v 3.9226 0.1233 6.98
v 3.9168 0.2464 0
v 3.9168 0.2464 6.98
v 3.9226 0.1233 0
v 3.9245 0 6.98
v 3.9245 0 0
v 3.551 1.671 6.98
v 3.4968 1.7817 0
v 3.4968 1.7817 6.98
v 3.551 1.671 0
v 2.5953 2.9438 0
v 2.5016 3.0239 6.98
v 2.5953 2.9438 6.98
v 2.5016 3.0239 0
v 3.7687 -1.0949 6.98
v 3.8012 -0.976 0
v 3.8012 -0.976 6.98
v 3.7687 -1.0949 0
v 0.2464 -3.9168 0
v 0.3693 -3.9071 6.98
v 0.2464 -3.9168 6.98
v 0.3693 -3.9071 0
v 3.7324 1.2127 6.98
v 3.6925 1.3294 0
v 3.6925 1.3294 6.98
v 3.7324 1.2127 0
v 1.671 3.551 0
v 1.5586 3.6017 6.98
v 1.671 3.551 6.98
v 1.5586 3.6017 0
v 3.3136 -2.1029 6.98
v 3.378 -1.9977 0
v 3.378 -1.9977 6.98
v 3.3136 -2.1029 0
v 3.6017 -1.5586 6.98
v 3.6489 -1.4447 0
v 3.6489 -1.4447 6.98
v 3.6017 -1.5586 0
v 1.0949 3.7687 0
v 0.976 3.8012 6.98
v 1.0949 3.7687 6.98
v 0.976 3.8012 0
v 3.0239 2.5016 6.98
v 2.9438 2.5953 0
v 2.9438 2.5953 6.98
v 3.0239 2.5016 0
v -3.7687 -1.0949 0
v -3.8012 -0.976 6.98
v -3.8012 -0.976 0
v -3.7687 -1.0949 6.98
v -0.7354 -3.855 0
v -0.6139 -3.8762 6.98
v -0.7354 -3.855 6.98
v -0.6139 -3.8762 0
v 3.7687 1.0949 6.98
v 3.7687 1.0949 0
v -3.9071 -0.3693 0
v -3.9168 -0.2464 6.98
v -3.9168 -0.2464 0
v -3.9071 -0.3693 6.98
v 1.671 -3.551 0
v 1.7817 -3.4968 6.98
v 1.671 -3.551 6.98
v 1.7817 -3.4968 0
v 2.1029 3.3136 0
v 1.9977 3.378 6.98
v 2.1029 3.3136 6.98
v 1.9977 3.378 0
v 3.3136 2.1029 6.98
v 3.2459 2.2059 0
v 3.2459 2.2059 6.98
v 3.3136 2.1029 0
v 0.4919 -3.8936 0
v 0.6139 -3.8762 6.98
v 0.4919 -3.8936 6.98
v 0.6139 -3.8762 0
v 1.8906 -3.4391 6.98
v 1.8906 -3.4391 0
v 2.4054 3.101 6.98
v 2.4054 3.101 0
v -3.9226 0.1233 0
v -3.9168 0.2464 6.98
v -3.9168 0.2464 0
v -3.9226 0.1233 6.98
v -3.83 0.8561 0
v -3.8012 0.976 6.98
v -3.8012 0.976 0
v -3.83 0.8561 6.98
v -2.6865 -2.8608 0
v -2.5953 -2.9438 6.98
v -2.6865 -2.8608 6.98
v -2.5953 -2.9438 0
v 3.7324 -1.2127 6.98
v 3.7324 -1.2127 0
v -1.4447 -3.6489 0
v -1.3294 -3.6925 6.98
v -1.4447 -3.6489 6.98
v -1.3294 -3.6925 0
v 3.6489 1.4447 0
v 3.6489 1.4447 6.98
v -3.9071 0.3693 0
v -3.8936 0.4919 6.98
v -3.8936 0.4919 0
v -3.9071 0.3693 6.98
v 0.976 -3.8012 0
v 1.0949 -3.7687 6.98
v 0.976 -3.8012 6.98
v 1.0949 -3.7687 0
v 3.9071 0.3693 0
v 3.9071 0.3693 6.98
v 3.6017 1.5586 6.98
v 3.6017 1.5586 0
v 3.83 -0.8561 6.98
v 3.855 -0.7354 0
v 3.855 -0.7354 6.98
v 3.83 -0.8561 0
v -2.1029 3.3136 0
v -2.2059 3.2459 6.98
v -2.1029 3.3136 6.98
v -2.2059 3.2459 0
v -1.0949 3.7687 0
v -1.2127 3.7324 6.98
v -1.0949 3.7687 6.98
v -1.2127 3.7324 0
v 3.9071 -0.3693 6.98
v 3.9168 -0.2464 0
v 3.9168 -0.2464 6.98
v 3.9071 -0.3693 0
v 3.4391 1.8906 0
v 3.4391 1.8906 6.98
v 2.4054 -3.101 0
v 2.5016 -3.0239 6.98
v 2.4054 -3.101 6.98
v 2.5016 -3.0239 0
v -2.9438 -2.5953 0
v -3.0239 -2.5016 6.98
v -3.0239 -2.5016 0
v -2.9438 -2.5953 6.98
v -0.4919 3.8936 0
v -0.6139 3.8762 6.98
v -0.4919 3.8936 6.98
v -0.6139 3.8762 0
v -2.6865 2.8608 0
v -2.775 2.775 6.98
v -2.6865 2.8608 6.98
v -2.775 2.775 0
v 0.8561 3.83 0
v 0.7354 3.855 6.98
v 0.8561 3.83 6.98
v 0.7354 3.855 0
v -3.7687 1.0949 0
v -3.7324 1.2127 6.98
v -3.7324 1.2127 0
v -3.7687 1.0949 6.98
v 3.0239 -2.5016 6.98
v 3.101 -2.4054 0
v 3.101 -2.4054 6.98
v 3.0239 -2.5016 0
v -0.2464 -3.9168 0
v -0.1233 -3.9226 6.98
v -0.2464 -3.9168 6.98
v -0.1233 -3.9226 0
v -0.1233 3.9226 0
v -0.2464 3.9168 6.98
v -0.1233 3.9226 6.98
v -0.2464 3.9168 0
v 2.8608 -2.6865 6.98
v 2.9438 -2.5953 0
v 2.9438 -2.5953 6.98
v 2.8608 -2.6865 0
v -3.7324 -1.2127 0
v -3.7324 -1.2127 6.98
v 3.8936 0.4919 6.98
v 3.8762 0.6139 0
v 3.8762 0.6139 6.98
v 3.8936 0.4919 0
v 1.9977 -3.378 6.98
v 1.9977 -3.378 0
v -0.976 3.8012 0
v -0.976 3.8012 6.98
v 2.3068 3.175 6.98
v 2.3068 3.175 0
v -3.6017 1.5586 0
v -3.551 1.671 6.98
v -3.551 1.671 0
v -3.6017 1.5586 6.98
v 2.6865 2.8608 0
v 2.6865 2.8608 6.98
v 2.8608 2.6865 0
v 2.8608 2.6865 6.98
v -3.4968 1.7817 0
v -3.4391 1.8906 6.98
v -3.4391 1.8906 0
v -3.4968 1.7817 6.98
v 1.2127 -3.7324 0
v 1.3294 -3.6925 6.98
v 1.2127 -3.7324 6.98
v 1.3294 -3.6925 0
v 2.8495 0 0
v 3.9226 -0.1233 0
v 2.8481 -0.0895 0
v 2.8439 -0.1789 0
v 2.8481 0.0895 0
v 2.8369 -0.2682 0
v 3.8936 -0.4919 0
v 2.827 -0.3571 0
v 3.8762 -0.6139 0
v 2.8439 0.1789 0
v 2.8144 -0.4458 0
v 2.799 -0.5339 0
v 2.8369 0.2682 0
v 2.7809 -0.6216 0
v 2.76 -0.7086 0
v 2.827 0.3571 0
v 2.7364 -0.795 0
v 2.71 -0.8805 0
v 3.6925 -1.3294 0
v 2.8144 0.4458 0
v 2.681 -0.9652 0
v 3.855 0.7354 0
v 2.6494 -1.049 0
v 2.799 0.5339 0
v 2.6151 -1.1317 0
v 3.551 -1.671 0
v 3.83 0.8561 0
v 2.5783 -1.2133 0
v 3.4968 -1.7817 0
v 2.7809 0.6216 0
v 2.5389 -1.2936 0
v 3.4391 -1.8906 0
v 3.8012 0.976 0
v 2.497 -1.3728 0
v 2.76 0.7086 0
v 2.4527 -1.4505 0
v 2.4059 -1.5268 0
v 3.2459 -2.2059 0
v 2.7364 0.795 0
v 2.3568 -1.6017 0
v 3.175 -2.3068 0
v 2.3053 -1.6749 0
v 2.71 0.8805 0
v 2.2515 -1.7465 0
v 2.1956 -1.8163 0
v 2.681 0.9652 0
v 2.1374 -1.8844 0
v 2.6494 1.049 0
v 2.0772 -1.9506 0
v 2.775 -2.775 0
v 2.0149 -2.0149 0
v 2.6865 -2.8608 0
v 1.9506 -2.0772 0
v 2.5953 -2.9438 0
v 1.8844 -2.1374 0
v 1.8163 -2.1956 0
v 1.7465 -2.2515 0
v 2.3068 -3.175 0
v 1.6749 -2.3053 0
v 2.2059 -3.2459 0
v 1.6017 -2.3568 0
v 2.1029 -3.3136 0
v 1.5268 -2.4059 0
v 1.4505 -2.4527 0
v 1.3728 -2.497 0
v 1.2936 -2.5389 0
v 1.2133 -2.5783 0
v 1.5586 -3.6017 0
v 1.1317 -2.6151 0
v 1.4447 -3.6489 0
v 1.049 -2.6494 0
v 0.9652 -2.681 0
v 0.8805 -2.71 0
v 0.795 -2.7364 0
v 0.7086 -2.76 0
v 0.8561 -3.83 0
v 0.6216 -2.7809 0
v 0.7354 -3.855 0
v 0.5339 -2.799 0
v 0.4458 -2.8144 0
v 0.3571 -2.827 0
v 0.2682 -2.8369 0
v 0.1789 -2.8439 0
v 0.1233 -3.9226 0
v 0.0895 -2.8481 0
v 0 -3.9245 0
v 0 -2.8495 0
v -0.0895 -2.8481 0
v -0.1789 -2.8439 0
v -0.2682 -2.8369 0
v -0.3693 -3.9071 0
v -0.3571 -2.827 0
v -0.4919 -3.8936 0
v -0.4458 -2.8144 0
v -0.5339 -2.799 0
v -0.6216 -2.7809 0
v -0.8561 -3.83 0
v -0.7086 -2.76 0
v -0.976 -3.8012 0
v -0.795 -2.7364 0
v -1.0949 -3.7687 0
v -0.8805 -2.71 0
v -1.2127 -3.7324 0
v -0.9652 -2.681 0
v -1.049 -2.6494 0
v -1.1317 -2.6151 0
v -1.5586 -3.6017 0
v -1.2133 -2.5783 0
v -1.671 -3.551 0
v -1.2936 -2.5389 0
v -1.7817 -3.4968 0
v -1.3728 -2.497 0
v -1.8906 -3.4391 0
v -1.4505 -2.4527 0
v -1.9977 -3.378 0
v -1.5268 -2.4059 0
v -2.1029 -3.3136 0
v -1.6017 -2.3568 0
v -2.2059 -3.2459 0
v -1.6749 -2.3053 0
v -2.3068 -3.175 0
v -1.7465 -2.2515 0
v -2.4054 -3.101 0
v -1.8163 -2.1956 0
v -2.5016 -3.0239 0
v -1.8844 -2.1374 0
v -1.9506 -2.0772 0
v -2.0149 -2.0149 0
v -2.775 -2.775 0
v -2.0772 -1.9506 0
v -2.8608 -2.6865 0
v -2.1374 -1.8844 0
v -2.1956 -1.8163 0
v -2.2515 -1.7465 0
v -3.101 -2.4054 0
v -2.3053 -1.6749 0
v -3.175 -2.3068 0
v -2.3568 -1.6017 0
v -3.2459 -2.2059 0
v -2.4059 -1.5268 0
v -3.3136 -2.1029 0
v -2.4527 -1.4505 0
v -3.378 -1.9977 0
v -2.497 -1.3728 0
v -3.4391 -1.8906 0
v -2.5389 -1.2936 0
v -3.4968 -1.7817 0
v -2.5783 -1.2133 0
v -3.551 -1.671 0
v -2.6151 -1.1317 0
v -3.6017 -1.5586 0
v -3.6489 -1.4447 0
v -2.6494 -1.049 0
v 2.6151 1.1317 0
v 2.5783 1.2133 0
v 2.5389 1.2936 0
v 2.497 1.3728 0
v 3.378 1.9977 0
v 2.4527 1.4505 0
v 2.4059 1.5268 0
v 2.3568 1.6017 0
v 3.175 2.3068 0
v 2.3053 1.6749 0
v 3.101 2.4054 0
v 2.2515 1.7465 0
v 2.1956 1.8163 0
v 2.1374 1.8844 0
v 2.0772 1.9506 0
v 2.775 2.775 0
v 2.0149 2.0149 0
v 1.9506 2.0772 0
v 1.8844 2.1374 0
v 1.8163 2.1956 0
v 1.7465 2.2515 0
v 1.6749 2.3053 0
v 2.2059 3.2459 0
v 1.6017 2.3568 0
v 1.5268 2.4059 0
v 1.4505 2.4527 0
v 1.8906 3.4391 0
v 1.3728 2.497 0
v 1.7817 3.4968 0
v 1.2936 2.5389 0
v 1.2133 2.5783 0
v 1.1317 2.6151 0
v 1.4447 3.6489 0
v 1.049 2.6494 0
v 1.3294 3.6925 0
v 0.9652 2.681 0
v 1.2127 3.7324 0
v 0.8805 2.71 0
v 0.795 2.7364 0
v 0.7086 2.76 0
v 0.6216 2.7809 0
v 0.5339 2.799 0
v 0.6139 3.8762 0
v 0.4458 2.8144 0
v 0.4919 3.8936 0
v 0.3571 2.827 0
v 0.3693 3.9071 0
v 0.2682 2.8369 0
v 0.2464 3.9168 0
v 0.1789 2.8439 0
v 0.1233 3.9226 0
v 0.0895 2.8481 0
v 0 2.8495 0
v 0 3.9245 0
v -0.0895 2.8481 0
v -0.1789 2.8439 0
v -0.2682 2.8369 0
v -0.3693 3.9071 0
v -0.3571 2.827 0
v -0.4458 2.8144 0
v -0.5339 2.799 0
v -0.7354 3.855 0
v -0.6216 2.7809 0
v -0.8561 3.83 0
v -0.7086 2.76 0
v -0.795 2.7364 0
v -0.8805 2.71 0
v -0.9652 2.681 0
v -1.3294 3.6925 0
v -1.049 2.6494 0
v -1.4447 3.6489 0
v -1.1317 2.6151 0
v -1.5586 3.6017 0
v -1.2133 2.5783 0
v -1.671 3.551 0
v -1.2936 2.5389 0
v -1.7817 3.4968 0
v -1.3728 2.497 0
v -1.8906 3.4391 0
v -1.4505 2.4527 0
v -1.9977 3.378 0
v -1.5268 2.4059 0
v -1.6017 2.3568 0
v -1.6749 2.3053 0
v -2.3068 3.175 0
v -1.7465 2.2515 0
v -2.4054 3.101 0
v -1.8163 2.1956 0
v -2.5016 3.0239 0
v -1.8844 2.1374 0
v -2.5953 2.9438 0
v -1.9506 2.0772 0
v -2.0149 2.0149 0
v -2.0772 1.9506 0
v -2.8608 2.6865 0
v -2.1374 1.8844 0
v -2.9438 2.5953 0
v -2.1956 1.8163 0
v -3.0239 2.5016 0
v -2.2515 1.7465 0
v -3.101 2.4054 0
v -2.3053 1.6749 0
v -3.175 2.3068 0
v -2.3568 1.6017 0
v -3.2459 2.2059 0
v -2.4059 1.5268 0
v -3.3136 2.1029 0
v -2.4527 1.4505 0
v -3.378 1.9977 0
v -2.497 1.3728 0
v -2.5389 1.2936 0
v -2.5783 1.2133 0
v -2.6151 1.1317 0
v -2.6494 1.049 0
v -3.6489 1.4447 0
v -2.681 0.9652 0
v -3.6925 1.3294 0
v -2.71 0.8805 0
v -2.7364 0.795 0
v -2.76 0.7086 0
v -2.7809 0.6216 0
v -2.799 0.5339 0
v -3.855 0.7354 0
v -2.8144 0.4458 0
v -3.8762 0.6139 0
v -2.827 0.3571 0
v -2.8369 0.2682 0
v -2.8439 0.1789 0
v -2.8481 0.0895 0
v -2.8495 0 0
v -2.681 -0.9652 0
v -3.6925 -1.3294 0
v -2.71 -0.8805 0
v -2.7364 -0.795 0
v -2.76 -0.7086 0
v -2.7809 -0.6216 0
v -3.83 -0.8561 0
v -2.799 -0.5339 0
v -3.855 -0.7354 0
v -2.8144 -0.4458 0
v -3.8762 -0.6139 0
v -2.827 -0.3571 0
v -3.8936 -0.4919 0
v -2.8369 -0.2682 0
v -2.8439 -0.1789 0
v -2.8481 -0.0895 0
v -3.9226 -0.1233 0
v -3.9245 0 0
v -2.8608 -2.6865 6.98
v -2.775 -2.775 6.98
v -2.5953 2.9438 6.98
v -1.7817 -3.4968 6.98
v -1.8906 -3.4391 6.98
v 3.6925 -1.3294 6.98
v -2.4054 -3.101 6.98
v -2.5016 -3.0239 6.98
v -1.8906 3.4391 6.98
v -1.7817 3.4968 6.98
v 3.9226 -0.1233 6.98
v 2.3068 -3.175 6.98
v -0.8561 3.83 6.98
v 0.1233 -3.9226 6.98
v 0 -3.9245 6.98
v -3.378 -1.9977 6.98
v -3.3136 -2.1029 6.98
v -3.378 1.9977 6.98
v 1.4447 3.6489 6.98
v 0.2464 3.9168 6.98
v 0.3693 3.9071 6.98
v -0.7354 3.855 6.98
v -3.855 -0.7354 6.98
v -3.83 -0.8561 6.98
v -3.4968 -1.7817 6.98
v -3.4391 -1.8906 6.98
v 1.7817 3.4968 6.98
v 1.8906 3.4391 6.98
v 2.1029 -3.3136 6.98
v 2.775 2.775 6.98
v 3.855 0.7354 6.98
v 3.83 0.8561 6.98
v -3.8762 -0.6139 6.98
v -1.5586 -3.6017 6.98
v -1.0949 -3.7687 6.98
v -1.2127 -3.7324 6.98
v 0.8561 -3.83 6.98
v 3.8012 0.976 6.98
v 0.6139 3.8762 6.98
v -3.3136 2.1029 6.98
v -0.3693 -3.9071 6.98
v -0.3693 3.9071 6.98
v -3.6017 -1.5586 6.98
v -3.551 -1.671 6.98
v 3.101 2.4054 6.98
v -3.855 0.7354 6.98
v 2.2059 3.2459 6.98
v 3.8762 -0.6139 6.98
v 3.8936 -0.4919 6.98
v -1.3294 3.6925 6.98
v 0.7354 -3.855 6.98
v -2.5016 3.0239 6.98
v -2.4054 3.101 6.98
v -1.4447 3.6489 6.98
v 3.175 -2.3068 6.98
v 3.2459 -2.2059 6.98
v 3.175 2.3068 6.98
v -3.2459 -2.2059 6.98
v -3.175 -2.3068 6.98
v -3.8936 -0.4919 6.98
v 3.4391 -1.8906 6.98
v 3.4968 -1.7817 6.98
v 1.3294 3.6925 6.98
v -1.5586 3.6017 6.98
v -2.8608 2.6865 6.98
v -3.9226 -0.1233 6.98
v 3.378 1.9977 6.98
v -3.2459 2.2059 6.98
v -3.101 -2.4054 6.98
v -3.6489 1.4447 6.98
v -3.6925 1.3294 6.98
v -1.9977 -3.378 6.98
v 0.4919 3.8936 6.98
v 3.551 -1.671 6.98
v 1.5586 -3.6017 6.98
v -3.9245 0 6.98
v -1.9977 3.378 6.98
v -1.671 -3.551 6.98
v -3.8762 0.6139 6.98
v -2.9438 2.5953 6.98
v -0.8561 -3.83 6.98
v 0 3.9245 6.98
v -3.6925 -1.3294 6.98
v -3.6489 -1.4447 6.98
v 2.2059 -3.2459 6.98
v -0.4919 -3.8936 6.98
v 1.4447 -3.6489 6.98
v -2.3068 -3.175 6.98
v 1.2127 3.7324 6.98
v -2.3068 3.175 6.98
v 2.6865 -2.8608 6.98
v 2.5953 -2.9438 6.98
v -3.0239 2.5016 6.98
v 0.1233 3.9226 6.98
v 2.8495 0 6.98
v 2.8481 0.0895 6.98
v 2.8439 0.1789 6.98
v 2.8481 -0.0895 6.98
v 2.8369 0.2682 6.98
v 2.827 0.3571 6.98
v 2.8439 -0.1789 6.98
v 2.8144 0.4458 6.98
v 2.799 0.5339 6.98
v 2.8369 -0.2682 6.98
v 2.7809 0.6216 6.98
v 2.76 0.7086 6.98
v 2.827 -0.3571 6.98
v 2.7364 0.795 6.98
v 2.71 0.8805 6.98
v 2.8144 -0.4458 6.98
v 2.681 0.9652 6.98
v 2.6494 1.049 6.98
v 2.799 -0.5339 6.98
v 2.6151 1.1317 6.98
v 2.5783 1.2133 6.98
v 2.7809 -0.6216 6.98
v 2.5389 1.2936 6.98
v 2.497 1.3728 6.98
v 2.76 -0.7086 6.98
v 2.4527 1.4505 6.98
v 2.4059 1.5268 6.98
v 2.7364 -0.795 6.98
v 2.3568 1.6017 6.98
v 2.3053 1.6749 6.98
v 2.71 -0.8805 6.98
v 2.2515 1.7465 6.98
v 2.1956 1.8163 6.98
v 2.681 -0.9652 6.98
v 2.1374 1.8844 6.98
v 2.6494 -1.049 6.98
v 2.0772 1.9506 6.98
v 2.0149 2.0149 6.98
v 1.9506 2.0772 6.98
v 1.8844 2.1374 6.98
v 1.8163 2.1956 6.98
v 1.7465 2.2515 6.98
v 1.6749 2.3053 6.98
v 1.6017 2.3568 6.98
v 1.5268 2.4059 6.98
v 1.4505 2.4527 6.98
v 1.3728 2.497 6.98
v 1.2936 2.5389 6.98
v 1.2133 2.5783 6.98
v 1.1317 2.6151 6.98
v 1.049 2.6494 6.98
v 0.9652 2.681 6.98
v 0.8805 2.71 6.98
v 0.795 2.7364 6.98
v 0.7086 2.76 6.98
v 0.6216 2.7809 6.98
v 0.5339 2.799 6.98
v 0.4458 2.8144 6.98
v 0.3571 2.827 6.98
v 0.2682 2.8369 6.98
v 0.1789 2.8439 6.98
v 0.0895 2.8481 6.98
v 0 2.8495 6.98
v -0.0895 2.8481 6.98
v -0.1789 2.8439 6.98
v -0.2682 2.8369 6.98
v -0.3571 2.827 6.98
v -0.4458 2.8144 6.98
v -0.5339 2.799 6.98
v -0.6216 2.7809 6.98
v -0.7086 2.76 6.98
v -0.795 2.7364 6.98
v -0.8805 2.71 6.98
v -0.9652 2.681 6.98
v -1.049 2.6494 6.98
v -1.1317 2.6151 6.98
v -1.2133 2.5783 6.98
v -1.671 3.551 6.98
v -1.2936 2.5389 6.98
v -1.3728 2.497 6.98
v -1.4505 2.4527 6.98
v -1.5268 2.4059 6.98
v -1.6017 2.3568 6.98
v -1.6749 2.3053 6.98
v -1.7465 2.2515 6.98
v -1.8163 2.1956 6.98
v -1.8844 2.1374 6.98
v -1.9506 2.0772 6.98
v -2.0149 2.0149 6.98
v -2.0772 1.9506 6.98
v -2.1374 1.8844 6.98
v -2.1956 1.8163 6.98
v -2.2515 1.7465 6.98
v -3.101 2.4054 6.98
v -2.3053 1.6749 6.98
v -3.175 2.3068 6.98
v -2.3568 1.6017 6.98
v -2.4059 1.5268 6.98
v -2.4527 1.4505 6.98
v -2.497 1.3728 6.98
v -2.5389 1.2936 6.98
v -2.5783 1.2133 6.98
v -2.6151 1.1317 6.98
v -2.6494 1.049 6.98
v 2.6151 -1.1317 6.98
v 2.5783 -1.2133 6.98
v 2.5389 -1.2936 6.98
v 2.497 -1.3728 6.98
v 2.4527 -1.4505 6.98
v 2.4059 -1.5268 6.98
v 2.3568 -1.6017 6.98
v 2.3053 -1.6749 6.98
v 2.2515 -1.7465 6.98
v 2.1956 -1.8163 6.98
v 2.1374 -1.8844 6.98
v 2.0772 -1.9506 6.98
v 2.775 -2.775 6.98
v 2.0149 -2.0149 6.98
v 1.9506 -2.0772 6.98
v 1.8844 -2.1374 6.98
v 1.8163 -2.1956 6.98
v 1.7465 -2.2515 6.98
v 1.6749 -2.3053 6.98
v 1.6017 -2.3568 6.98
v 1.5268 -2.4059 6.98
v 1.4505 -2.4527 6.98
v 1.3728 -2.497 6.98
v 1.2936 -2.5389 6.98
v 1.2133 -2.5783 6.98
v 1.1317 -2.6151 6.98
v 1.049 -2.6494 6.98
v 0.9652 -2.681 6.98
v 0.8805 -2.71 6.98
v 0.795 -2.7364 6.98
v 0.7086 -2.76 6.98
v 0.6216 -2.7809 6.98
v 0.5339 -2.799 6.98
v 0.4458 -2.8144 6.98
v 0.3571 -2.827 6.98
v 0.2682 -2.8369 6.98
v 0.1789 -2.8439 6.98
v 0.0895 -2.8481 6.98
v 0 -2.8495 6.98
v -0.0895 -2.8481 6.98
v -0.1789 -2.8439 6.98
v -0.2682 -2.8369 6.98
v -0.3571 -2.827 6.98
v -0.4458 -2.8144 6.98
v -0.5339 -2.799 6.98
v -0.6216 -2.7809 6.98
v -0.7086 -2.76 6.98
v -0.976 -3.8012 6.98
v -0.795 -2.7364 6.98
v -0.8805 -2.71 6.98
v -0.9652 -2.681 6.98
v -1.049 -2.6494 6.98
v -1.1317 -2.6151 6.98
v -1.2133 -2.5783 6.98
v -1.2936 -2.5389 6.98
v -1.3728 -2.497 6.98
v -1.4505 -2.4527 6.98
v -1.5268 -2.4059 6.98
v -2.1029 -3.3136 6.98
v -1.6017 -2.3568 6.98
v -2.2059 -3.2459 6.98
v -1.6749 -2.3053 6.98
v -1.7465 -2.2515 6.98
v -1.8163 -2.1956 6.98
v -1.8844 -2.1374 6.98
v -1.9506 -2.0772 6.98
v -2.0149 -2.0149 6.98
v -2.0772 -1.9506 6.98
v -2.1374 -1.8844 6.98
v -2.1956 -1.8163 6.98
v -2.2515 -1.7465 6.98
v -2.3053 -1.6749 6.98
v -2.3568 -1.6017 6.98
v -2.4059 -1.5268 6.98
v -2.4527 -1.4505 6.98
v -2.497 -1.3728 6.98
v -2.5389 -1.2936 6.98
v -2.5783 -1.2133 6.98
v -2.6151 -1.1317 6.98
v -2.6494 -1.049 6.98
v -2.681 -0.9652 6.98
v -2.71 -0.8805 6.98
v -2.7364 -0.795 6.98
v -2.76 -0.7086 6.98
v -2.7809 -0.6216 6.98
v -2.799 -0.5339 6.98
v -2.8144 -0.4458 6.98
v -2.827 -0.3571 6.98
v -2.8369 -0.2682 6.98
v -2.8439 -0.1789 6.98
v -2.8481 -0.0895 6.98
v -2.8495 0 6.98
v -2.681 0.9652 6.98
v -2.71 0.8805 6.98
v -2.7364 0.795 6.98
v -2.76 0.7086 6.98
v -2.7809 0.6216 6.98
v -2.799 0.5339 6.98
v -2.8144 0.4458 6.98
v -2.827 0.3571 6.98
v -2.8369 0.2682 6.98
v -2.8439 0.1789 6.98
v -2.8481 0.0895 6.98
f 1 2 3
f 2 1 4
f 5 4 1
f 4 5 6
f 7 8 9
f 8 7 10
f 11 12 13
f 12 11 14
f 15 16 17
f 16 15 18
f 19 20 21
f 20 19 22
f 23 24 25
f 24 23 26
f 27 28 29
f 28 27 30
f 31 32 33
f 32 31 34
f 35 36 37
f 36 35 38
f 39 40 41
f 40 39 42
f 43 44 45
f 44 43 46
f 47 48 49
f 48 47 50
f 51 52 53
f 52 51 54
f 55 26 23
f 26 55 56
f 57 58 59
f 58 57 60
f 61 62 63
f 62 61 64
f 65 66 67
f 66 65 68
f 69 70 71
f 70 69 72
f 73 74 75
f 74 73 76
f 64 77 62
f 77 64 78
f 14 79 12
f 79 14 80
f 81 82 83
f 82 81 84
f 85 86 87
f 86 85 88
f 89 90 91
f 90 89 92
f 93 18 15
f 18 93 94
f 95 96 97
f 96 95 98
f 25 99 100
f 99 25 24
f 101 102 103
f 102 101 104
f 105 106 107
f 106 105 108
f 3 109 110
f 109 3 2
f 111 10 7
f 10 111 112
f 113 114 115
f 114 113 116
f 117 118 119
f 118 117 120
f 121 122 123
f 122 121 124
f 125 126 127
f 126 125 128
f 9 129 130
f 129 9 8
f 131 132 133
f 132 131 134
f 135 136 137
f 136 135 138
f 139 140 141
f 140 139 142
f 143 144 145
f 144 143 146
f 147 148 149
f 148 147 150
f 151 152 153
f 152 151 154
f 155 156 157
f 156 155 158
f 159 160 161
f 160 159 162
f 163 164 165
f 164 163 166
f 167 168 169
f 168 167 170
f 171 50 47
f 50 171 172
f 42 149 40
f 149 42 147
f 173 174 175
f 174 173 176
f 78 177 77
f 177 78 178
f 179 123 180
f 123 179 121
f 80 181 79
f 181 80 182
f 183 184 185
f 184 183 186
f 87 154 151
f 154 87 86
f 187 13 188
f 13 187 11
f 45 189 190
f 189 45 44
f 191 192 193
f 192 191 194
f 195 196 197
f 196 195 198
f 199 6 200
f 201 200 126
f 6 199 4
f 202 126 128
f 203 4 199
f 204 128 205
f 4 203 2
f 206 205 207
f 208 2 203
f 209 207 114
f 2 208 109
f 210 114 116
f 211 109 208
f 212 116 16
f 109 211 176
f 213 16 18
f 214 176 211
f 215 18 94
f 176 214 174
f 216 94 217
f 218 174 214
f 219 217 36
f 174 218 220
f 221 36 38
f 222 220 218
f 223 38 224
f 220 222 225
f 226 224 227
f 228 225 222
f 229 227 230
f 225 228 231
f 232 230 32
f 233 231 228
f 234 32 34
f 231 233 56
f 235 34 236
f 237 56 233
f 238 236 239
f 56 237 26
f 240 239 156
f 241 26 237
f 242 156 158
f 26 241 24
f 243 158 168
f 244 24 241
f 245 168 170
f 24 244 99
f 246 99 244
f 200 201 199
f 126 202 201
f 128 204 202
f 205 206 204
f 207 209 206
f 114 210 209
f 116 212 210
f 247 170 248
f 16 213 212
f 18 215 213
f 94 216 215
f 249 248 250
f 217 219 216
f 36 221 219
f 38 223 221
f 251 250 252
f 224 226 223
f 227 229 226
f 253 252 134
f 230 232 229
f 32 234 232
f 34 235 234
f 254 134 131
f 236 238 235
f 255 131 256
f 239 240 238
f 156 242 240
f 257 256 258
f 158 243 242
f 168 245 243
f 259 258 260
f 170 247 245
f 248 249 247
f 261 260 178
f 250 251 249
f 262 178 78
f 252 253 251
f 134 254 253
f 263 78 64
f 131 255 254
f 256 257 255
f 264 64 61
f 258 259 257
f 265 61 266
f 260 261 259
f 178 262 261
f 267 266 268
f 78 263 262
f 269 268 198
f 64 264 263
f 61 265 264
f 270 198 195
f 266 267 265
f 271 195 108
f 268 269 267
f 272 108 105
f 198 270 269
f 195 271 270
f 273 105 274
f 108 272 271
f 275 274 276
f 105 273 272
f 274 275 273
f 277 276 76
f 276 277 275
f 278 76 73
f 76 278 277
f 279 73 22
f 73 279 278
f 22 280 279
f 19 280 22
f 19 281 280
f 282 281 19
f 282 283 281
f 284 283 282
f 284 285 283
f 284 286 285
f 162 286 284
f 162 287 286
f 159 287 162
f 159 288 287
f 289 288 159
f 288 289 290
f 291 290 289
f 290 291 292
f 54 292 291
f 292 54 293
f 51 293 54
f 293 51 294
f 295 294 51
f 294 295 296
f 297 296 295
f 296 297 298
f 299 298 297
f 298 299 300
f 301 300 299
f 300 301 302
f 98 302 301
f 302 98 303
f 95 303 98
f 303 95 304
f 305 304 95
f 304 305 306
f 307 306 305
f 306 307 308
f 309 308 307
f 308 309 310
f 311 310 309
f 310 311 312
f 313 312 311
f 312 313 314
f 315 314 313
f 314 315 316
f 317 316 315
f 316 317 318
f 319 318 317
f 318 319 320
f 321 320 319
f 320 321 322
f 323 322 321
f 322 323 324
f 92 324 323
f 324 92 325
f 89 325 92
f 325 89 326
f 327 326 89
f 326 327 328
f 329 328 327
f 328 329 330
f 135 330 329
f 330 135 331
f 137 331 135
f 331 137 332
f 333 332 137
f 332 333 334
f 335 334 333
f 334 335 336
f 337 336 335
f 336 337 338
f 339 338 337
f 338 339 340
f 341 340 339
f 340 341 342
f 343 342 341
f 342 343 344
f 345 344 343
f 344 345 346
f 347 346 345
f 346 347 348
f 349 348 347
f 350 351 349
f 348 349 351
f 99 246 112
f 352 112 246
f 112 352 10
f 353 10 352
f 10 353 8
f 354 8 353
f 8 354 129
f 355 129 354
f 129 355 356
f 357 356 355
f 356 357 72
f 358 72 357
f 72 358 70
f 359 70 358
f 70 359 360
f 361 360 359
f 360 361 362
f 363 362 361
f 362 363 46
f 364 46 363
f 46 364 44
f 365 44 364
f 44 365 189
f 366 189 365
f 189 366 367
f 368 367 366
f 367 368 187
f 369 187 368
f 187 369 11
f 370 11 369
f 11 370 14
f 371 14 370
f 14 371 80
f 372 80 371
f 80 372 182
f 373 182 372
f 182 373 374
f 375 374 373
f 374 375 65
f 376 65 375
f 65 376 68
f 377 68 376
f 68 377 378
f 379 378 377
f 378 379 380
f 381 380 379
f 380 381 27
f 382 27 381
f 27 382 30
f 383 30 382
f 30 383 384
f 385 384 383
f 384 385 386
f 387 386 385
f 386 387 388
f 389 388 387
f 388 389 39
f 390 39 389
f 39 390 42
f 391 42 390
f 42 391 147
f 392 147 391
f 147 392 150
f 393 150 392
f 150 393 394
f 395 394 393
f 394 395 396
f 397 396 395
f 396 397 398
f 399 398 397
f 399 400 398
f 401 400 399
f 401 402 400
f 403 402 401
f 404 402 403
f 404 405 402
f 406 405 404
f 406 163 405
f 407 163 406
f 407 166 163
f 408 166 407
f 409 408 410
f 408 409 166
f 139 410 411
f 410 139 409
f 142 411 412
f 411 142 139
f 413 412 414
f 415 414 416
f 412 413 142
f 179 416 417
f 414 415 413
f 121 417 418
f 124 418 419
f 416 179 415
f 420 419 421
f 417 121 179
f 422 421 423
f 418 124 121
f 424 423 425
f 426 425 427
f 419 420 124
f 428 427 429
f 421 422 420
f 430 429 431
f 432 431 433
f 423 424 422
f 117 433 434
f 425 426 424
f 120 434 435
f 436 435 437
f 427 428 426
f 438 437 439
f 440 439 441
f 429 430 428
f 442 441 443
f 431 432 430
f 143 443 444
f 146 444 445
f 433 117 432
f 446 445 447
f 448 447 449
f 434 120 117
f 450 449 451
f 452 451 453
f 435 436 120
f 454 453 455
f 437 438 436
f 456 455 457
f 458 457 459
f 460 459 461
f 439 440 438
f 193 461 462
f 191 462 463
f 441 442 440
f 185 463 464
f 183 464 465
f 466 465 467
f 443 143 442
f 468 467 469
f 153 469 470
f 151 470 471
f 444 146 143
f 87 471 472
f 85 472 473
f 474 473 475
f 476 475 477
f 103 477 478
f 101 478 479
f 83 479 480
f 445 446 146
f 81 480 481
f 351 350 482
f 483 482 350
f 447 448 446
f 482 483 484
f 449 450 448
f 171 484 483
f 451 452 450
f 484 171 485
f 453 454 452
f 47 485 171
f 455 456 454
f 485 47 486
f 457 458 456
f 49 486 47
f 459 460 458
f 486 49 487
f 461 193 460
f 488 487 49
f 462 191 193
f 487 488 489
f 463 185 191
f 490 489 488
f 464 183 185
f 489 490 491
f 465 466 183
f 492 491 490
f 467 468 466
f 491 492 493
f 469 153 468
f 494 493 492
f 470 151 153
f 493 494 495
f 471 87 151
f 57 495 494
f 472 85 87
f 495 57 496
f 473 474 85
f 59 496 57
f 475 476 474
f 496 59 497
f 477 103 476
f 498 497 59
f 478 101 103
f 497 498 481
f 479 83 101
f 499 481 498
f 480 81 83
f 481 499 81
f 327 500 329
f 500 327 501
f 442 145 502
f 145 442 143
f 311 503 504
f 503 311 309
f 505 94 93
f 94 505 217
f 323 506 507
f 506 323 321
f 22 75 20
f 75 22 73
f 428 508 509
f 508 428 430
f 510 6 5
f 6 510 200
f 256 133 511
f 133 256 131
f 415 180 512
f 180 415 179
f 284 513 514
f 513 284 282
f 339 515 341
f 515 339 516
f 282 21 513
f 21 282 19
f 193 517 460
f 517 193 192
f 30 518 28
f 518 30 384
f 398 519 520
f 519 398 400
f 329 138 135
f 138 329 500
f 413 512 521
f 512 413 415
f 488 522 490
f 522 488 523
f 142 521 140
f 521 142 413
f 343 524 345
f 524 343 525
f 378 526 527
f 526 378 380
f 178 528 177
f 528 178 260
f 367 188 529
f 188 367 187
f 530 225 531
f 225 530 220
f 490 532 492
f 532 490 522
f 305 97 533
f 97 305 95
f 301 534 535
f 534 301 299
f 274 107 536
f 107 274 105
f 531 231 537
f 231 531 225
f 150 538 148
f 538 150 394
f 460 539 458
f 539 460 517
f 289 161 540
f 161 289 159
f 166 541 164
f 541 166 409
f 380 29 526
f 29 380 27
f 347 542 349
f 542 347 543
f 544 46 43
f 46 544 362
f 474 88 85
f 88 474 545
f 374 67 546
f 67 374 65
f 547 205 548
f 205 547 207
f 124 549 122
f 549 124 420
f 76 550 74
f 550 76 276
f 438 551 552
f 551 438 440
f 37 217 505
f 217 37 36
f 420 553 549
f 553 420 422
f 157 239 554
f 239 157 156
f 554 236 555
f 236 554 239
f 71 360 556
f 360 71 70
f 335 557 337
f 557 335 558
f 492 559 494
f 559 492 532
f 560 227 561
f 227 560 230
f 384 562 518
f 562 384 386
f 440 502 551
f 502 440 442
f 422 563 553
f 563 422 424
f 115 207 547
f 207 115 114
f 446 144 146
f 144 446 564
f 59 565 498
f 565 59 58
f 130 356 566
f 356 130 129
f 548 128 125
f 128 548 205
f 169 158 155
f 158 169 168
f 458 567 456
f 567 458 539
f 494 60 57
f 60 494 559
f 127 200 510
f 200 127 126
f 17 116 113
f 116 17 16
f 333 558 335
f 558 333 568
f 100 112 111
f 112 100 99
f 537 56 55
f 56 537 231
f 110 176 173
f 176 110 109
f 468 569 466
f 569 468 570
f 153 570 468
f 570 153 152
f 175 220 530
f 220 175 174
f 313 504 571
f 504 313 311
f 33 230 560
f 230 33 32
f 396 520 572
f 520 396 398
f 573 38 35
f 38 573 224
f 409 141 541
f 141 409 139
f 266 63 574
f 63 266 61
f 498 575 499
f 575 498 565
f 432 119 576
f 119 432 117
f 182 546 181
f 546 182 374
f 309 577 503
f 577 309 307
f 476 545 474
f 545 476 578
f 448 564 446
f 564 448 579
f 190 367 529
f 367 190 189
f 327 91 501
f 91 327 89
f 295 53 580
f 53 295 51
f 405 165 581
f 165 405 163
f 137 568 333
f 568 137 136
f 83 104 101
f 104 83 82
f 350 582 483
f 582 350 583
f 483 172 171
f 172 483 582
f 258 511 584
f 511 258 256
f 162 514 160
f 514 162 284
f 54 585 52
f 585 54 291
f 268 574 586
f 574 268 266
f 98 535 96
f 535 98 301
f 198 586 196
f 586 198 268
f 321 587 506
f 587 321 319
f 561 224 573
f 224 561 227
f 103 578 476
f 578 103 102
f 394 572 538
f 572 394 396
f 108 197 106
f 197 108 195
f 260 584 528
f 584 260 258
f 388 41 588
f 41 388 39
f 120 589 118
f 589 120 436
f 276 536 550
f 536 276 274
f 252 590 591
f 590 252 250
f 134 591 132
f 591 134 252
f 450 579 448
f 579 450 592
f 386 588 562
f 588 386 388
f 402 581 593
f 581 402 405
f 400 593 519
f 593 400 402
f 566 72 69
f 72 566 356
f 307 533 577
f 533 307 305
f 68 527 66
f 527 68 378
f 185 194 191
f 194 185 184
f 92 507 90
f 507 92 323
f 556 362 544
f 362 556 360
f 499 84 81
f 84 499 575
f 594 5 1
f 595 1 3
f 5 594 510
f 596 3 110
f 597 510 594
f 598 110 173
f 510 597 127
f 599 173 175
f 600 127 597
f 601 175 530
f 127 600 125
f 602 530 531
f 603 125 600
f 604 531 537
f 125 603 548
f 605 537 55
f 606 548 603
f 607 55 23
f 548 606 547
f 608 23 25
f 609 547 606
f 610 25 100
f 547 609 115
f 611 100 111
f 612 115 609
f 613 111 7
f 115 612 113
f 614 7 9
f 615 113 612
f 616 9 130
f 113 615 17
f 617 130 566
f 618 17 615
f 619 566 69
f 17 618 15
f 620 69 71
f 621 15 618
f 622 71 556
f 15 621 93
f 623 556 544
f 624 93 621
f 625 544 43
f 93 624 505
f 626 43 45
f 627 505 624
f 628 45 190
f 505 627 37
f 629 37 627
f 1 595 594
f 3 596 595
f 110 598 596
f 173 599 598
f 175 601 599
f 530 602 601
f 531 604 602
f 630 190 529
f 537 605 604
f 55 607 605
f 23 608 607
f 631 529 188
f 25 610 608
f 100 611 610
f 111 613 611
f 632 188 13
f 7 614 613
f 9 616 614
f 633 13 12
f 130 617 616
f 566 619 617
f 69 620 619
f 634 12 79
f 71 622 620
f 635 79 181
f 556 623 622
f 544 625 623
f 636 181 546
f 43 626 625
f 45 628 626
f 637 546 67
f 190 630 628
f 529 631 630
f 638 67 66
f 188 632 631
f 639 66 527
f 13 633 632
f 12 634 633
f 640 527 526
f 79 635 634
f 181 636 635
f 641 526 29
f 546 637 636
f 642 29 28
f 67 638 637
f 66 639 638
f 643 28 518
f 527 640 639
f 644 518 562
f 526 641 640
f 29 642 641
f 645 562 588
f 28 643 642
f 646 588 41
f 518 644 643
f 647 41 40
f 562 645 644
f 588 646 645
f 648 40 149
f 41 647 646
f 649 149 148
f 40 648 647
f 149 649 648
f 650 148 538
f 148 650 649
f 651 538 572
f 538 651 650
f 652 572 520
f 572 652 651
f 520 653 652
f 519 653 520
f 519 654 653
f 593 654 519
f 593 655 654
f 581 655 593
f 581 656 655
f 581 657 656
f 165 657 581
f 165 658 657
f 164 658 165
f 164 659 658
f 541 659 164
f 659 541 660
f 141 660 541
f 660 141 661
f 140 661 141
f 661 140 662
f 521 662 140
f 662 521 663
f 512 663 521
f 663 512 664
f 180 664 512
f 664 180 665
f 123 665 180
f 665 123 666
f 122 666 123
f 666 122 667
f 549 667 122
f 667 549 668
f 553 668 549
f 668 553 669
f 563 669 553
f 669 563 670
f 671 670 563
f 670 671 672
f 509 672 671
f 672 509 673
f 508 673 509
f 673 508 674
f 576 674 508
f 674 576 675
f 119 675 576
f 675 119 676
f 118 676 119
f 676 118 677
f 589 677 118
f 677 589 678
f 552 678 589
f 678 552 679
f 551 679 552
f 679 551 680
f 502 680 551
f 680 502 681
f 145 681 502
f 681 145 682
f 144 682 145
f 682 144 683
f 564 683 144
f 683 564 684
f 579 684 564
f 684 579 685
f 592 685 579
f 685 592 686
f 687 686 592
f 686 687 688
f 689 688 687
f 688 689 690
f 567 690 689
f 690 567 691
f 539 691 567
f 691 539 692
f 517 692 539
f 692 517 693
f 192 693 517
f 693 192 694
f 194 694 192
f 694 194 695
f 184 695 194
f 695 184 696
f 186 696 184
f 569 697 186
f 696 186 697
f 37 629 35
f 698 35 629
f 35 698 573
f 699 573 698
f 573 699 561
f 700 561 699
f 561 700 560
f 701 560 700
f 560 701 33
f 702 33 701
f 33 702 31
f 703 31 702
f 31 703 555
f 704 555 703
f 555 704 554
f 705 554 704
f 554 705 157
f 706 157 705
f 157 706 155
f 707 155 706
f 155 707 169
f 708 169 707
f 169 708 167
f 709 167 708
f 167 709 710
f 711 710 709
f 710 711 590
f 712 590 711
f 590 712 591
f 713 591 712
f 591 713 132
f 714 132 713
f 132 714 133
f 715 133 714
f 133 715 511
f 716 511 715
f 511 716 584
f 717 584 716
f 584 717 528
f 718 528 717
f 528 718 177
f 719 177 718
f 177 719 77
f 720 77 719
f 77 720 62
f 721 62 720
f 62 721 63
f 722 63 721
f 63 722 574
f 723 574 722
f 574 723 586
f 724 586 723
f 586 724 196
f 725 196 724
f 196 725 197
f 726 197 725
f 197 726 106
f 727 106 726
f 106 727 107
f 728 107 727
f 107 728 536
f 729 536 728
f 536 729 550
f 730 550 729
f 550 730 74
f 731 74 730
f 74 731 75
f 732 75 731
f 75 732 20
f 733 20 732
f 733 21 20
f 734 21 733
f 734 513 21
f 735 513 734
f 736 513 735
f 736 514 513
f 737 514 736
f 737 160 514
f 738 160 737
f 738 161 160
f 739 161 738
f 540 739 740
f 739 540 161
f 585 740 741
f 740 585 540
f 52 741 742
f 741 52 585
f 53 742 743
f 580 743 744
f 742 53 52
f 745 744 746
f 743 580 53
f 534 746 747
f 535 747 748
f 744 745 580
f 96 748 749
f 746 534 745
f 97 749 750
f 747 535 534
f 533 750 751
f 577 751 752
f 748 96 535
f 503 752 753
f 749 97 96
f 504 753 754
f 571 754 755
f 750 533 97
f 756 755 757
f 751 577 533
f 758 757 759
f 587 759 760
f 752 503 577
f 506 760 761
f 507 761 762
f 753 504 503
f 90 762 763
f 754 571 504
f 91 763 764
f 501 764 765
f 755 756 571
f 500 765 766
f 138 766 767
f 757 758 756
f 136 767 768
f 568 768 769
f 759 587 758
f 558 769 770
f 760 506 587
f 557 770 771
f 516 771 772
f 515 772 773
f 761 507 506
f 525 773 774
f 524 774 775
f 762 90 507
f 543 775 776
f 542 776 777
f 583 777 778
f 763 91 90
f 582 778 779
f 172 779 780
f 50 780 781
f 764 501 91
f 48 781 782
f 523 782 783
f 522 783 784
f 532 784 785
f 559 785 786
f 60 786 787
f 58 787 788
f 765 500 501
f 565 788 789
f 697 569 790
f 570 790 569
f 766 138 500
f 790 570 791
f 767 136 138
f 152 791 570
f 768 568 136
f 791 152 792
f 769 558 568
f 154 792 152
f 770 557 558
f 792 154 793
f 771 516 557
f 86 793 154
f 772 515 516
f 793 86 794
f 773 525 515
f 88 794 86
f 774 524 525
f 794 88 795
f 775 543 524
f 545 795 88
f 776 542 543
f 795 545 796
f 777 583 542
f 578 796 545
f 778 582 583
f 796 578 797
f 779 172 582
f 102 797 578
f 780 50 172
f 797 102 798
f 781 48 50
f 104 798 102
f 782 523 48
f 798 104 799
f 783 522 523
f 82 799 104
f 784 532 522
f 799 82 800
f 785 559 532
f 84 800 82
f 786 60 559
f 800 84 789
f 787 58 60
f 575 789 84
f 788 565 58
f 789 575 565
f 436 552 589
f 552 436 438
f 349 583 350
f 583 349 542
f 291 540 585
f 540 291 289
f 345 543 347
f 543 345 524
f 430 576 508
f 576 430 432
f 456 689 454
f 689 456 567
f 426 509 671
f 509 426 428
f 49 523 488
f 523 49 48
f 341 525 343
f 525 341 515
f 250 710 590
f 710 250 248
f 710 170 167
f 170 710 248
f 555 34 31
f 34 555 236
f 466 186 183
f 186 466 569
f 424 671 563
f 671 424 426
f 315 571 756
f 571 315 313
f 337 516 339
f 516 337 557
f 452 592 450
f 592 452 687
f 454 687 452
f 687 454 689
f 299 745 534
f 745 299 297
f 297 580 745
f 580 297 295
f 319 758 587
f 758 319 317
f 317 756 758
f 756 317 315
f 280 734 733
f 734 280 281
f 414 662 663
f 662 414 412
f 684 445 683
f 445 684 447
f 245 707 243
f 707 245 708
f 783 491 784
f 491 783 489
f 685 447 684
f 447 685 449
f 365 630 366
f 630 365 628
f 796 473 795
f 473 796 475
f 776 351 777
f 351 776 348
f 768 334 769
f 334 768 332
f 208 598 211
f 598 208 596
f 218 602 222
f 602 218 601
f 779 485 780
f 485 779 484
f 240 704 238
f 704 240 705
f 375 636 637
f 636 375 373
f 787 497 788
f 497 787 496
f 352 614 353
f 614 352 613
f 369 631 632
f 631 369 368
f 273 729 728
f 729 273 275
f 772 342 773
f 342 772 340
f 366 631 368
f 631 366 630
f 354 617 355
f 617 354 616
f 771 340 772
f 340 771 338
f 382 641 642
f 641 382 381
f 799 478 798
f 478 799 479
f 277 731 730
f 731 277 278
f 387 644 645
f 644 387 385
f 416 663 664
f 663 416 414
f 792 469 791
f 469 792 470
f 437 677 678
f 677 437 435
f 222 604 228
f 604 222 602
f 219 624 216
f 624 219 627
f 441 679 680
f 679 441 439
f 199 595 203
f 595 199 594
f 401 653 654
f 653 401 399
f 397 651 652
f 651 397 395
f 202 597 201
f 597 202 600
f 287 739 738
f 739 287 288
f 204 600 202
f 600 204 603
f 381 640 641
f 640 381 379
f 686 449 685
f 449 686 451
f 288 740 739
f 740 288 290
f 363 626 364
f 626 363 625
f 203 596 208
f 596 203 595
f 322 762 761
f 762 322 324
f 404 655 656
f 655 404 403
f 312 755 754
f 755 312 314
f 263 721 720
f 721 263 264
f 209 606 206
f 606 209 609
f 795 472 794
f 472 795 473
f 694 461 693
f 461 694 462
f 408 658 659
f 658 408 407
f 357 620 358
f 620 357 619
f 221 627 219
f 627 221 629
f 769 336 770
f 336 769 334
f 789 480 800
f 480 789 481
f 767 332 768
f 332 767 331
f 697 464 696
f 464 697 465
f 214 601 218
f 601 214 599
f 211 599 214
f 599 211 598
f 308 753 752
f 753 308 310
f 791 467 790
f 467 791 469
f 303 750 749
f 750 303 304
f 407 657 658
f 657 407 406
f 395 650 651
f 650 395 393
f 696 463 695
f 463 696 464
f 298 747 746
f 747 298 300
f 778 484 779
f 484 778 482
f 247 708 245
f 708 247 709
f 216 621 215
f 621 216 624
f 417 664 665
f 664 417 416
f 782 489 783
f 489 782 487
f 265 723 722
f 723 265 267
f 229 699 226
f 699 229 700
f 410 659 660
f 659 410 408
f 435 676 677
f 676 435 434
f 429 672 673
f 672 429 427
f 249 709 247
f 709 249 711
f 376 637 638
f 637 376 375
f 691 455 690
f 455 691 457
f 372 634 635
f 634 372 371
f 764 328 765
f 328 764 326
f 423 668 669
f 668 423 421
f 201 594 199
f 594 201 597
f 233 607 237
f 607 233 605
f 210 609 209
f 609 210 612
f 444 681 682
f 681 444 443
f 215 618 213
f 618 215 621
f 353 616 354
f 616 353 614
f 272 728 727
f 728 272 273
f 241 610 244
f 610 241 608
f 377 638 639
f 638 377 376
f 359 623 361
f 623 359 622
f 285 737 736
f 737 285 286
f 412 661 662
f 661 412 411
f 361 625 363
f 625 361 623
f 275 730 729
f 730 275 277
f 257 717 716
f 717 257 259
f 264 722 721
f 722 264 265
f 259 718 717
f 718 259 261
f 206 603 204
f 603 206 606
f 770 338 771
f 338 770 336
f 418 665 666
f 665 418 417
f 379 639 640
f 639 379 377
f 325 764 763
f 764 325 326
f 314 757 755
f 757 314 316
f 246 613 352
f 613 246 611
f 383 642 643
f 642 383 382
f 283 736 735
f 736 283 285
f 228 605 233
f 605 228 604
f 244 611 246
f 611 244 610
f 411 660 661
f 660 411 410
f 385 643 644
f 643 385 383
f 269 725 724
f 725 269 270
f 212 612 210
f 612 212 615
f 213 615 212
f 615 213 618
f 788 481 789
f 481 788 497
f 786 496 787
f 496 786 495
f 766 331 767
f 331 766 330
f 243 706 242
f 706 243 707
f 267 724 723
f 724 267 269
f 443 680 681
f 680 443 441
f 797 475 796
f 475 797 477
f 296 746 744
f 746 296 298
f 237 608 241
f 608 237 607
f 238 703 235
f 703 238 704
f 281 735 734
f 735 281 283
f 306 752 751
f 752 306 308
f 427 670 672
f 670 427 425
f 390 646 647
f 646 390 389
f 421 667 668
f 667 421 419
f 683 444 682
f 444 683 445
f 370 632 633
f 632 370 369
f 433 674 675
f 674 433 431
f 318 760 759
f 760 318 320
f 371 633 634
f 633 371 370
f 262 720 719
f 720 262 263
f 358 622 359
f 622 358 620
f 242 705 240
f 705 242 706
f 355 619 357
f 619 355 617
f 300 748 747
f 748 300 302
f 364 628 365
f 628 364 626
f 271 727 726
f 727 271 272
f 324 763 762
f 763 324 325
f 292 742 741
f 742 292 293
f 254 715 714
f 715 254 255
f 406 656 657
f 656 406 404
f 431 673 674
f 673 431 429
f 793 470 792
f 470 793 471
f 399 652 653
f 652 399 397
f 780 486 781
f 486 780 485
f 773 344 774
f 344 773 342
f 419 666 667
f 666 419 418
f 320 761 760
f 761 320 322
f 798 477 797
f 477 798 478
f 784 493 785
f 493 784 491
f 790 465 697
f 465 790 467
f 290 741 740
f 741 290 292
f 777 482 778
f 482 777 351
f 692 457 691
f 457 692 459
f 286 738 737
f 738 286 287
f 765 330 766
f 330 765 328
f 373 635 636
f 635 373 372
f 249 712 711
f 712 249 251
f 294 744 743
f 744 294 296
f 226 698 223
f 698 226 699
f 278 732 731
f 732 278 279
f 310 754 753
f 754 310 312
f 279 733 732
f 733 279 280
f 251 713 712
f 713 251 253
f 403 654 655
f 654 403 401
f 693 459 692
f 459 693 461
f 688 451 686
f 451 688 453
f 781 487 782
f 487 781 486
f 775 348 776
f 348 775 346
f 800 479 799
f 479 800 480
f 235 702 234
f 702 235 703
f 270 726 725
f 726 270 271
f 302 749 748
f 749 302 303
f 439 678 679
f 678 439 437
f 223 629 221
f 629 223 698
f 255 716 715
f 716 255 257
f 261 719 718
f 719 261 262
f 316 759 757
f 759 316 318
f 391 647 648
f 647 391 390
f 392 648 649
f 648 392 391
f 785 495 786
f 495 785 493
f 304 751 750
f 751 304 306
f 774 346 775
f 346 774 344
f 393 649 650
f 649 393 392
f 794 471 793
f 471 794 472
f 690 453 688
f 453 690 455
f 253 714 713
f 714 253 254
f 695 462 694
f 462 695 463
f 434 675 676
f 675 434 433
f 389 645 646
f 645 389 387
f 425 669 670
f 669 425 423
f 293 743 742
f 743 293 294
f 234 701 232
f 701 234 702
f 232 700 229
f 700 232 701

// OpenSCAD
$fn=200;

bearingInnerDiameter=7.85;
rodDiameter=5.7;

bearingWidth=6.98;
tolerance=0.001;

difference()
{
	cylinder(r=(bearingInnerDiameter-tolerance)/2,h=bearingWidth);
	cylinder(r=(rodDiameter-tolerance)/2,h=bearingWidth);
}
